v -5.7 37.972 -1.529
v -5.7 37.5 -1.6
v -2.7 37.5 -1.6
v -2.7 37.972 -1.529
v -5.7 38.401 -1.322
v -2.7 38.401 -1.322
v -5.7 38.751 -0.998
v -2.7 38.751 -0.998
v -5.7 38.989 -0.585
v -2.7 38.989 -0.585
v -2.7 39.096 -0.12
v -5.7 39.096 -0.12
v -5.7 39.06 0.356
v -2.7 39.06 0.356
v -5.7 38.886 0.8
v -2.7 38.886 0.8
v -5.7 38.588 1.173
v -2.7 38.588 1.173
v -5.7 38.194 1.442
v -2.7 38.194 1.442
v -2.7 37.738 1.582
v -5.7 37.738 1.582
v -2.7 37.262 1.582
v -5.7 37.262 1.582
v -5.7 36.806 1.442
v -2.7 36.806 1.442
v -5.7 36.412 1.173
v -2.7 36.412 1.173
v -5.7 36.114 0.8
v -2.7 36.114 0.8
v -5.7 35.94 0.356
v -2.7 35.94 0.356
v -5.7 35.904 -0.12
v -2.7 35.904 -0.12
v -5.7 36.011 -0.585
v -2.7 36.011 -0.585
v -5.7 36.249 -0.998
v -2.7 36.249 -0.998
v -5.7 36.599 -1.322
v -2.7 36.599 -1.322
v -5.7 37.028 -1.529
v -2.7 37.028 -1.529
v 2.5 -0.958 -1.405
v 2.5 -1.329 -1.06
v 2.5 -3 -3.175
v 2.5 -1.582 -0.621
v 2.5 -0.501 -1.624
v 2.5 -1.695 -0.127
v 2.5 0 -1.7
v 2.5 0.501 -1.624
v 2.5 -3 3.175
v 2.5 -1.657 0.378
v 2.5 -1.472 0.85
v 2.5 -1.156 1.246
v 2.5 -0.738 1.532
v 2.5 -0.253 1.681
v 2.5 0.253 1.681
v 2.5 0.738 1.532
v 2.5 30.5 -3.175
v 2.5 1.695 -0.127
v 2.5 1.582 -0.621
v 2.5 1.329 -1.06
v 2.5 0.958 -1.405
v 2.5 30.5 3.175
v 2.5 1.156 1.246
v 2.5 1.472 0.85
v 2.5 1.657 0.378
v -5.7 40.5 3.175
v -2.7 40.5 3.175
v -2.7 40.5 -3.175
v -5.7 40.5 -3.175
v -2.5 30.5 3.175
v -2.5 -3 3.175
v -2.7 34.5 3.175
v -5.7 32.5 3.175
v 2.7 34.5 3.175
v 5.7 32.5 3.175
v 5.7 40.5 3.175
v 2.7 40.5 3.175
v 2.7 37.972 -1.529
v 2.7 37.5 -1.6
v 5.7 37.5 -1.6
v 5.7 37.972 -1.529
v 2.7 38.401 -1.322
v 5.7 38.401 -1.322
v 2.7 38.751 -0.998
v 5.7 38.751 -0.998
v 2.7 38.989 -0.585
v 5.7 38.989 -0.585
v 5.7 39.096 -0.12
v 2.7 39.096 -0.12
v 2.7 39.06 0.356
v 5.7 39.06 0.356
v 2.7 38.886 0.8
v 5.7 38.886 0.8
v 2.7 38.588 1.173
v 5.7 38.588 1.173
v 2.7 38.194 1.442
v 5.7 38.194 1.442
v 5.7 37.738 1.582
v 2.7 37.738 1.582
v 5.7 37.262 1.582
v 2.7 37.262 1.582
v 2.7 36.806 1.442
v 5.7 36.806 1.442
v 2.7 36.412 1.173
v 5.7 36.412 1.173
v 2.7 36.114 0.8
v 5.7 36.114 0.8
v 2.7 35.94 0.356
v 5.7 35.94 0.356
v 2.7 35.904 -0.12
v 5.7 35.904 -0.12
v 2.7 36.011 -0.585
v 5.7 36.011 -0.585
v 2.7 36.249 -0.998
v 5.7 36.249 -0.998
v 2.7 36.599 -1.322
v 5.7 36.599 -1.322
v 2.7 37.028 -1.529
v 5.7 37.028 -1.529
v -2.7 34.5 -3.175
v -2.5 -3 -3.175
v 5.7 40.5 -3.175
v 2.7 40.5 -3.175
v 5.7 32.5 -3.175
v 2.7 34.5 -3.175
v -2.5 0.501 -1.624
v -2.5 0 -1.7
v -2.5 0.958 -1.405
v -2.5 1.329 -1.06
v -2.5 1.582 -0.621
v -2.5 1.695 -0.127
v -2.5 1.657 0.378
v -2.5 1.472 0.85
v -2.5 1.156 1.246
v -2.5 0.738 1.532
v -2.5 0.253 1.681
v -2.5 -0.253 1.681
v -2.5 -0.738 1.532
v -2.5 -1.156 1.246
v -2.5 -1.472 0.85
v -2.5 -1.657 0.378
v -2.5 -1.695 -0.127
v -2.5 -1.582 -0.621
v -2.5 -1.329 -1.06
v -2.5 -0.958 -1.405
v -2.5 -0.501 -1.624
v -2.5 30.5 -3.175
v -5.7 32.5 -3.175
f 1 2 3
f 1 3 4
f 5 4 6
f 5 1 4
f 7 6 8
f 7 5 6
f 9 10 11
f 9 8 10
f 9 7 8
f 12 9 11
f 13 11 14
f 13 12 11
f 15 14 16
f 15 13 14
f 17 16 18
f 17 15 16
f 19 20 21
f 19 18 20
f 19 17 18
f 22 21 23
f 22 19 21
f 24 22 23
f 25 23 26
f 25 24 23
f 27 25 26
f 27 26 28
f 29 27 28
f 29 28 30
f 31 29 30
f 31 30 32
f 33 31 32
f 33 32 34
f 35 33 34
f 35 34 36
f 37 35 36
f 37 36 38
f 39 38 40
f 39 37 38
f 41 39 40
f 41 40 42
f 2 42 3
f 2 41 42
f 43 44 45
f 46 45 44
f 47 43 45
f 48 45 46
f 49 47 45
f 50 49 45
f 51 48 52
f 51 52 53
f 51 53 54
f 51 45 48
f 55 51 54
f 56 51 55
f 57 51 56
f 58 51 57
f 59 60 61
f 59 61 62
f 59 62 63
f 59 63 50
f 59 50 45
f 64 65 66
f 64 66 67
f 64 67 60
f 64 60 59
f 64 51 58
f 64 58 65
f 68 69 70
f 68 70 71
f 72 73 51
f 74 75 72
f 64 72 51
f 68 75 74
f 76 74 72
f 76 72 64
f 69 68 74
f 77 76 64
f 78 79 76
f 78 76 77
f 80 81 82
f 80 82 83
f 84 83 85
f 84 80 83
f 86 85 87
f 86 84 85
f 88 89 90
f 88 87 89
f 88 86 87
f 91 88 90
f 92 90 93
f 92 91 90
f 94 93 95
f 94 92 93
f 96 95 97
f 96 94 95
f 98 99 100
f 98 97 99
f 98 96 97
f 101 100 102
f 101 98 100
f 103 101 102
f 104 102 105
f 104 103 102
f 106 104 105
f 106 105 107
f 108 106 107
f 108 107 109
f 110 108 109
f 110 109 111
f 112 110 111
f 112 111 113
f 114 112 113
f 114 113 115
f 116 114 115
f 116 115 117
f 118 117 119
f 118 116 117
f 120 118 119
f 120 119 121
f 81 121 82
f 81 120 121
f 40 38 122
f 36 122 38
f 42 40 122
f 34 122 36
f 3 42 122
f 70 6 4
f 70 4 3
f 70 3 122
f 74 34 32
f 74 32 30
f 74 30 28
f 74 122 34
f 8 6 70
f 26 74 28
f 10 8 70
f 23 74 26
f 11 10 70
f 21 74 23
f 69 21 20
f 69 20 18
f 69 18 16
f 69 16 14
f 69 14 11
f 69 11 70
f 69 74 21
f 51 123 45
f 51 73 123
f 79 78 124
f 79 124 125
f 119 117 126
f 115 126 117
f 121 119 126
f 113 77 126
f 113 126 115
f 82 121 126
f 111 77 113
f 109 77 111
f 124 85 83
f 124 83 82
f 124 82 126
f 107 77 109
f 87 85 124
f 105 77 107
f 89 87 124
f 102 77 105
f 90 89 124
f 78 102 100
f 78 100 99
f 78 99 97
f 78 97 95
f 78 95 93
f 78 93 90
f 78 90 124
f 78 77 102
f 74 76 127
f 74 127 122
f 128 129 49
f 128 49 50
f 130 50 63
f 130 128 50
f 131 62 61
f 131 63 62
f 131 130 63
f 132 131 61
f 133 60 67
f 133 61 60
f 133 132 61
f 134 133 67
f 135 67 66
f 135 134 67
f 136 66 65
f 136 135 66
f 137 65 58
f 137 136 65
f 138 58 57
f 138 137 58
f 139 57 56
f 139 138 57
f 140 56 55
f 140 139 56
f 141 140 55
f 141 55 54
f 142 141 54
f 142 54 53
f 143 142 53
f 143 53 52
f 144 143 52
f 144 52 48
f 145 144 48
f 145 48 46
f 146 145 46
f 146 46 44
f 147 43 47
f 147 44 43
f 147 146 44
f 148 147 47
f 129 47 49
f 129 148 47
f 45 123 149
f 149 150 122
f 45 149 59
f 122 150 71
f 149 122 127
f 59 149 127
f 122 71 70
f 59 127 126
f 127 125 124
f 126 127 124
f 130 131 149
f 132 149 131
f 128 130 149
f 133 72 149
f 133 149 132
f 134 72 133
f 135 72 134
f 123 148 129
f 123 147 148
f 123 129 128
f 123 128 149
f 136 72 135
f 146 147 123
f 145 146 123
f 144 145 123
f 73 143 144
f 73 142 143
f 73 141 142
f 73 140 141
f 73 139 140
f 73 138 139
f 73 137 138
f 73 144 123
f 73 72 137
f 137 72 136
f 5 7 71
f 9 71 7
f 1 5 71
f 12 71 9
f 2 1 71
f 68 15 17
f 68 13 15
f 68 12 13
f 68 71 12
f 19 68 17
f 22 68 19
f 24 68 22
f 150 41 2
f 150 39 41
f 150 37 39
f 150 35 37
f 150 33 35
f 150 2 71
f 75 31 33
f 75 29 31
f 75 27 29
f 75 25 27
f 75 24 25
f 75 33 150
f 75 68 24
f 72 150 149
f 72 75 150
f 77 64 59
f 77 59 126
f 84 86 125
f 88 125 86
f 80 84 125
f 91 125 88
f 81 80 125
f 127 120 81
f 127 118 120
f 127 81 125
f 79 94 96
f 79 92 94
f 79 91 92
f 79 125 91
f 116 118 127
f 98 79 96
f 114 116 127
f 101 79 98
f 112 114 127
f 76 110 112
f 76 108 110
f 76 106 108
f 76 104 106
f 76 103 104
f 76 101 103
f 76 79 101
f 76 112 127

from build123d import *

# Parameters (mm, degrees)
BOSS_EXTRUDE1_DEPTH     = 3.175
CUT_EXTRUDE1_DEPTH      = 42.022196735
CUT_EXTRUDE1_DEPTH_BACK = 42.022196735
SKETCH2_R               = 1.7
SKETCH2_R_2             = 1.6


with BuildPart() as part:
    # Sketch1 → Boss-Extrude1 (new, symmetric)
    with BuildSketch(Plane.XY):
        Polygon((-2.5, -3), (2.5, -3), (2.5, 30.5), (5.7, 32.5), (5.7, 40.5), (2.7, 40.5), (2.7, 34.5), (-2.7, 34.5), (-2.7, 40.5), (-5.7, 40.5), (-5.7, 32.5), (-2.5, 30.5), align=None)
    extrude(amount=BOSS_EXTRUDE1_DEPTH, both=True)

    # Sketch2 → Cut-Extrude1 (cut, two sides: drawn at the far end of the back side and taken through both)
    with BuildSketch(Plane(origin=(0, 0, 0), x_dir=(0, 0, -1), z_dir=(1, 0, 0)).offset(-CUT_EXTRUDE1_DEPTH_BACK)):
        Circle(SKETCH2_R)
        with Locations((0, 37.5)):
            Circle(SKETCH2_R_2)
    extrude(amount=CUT_EXTRUDE1_DEPTH + CUT_EXTRUDE1_DEPTH_BACK, mode=Mode.SUBTRACT)


solid = part.part
